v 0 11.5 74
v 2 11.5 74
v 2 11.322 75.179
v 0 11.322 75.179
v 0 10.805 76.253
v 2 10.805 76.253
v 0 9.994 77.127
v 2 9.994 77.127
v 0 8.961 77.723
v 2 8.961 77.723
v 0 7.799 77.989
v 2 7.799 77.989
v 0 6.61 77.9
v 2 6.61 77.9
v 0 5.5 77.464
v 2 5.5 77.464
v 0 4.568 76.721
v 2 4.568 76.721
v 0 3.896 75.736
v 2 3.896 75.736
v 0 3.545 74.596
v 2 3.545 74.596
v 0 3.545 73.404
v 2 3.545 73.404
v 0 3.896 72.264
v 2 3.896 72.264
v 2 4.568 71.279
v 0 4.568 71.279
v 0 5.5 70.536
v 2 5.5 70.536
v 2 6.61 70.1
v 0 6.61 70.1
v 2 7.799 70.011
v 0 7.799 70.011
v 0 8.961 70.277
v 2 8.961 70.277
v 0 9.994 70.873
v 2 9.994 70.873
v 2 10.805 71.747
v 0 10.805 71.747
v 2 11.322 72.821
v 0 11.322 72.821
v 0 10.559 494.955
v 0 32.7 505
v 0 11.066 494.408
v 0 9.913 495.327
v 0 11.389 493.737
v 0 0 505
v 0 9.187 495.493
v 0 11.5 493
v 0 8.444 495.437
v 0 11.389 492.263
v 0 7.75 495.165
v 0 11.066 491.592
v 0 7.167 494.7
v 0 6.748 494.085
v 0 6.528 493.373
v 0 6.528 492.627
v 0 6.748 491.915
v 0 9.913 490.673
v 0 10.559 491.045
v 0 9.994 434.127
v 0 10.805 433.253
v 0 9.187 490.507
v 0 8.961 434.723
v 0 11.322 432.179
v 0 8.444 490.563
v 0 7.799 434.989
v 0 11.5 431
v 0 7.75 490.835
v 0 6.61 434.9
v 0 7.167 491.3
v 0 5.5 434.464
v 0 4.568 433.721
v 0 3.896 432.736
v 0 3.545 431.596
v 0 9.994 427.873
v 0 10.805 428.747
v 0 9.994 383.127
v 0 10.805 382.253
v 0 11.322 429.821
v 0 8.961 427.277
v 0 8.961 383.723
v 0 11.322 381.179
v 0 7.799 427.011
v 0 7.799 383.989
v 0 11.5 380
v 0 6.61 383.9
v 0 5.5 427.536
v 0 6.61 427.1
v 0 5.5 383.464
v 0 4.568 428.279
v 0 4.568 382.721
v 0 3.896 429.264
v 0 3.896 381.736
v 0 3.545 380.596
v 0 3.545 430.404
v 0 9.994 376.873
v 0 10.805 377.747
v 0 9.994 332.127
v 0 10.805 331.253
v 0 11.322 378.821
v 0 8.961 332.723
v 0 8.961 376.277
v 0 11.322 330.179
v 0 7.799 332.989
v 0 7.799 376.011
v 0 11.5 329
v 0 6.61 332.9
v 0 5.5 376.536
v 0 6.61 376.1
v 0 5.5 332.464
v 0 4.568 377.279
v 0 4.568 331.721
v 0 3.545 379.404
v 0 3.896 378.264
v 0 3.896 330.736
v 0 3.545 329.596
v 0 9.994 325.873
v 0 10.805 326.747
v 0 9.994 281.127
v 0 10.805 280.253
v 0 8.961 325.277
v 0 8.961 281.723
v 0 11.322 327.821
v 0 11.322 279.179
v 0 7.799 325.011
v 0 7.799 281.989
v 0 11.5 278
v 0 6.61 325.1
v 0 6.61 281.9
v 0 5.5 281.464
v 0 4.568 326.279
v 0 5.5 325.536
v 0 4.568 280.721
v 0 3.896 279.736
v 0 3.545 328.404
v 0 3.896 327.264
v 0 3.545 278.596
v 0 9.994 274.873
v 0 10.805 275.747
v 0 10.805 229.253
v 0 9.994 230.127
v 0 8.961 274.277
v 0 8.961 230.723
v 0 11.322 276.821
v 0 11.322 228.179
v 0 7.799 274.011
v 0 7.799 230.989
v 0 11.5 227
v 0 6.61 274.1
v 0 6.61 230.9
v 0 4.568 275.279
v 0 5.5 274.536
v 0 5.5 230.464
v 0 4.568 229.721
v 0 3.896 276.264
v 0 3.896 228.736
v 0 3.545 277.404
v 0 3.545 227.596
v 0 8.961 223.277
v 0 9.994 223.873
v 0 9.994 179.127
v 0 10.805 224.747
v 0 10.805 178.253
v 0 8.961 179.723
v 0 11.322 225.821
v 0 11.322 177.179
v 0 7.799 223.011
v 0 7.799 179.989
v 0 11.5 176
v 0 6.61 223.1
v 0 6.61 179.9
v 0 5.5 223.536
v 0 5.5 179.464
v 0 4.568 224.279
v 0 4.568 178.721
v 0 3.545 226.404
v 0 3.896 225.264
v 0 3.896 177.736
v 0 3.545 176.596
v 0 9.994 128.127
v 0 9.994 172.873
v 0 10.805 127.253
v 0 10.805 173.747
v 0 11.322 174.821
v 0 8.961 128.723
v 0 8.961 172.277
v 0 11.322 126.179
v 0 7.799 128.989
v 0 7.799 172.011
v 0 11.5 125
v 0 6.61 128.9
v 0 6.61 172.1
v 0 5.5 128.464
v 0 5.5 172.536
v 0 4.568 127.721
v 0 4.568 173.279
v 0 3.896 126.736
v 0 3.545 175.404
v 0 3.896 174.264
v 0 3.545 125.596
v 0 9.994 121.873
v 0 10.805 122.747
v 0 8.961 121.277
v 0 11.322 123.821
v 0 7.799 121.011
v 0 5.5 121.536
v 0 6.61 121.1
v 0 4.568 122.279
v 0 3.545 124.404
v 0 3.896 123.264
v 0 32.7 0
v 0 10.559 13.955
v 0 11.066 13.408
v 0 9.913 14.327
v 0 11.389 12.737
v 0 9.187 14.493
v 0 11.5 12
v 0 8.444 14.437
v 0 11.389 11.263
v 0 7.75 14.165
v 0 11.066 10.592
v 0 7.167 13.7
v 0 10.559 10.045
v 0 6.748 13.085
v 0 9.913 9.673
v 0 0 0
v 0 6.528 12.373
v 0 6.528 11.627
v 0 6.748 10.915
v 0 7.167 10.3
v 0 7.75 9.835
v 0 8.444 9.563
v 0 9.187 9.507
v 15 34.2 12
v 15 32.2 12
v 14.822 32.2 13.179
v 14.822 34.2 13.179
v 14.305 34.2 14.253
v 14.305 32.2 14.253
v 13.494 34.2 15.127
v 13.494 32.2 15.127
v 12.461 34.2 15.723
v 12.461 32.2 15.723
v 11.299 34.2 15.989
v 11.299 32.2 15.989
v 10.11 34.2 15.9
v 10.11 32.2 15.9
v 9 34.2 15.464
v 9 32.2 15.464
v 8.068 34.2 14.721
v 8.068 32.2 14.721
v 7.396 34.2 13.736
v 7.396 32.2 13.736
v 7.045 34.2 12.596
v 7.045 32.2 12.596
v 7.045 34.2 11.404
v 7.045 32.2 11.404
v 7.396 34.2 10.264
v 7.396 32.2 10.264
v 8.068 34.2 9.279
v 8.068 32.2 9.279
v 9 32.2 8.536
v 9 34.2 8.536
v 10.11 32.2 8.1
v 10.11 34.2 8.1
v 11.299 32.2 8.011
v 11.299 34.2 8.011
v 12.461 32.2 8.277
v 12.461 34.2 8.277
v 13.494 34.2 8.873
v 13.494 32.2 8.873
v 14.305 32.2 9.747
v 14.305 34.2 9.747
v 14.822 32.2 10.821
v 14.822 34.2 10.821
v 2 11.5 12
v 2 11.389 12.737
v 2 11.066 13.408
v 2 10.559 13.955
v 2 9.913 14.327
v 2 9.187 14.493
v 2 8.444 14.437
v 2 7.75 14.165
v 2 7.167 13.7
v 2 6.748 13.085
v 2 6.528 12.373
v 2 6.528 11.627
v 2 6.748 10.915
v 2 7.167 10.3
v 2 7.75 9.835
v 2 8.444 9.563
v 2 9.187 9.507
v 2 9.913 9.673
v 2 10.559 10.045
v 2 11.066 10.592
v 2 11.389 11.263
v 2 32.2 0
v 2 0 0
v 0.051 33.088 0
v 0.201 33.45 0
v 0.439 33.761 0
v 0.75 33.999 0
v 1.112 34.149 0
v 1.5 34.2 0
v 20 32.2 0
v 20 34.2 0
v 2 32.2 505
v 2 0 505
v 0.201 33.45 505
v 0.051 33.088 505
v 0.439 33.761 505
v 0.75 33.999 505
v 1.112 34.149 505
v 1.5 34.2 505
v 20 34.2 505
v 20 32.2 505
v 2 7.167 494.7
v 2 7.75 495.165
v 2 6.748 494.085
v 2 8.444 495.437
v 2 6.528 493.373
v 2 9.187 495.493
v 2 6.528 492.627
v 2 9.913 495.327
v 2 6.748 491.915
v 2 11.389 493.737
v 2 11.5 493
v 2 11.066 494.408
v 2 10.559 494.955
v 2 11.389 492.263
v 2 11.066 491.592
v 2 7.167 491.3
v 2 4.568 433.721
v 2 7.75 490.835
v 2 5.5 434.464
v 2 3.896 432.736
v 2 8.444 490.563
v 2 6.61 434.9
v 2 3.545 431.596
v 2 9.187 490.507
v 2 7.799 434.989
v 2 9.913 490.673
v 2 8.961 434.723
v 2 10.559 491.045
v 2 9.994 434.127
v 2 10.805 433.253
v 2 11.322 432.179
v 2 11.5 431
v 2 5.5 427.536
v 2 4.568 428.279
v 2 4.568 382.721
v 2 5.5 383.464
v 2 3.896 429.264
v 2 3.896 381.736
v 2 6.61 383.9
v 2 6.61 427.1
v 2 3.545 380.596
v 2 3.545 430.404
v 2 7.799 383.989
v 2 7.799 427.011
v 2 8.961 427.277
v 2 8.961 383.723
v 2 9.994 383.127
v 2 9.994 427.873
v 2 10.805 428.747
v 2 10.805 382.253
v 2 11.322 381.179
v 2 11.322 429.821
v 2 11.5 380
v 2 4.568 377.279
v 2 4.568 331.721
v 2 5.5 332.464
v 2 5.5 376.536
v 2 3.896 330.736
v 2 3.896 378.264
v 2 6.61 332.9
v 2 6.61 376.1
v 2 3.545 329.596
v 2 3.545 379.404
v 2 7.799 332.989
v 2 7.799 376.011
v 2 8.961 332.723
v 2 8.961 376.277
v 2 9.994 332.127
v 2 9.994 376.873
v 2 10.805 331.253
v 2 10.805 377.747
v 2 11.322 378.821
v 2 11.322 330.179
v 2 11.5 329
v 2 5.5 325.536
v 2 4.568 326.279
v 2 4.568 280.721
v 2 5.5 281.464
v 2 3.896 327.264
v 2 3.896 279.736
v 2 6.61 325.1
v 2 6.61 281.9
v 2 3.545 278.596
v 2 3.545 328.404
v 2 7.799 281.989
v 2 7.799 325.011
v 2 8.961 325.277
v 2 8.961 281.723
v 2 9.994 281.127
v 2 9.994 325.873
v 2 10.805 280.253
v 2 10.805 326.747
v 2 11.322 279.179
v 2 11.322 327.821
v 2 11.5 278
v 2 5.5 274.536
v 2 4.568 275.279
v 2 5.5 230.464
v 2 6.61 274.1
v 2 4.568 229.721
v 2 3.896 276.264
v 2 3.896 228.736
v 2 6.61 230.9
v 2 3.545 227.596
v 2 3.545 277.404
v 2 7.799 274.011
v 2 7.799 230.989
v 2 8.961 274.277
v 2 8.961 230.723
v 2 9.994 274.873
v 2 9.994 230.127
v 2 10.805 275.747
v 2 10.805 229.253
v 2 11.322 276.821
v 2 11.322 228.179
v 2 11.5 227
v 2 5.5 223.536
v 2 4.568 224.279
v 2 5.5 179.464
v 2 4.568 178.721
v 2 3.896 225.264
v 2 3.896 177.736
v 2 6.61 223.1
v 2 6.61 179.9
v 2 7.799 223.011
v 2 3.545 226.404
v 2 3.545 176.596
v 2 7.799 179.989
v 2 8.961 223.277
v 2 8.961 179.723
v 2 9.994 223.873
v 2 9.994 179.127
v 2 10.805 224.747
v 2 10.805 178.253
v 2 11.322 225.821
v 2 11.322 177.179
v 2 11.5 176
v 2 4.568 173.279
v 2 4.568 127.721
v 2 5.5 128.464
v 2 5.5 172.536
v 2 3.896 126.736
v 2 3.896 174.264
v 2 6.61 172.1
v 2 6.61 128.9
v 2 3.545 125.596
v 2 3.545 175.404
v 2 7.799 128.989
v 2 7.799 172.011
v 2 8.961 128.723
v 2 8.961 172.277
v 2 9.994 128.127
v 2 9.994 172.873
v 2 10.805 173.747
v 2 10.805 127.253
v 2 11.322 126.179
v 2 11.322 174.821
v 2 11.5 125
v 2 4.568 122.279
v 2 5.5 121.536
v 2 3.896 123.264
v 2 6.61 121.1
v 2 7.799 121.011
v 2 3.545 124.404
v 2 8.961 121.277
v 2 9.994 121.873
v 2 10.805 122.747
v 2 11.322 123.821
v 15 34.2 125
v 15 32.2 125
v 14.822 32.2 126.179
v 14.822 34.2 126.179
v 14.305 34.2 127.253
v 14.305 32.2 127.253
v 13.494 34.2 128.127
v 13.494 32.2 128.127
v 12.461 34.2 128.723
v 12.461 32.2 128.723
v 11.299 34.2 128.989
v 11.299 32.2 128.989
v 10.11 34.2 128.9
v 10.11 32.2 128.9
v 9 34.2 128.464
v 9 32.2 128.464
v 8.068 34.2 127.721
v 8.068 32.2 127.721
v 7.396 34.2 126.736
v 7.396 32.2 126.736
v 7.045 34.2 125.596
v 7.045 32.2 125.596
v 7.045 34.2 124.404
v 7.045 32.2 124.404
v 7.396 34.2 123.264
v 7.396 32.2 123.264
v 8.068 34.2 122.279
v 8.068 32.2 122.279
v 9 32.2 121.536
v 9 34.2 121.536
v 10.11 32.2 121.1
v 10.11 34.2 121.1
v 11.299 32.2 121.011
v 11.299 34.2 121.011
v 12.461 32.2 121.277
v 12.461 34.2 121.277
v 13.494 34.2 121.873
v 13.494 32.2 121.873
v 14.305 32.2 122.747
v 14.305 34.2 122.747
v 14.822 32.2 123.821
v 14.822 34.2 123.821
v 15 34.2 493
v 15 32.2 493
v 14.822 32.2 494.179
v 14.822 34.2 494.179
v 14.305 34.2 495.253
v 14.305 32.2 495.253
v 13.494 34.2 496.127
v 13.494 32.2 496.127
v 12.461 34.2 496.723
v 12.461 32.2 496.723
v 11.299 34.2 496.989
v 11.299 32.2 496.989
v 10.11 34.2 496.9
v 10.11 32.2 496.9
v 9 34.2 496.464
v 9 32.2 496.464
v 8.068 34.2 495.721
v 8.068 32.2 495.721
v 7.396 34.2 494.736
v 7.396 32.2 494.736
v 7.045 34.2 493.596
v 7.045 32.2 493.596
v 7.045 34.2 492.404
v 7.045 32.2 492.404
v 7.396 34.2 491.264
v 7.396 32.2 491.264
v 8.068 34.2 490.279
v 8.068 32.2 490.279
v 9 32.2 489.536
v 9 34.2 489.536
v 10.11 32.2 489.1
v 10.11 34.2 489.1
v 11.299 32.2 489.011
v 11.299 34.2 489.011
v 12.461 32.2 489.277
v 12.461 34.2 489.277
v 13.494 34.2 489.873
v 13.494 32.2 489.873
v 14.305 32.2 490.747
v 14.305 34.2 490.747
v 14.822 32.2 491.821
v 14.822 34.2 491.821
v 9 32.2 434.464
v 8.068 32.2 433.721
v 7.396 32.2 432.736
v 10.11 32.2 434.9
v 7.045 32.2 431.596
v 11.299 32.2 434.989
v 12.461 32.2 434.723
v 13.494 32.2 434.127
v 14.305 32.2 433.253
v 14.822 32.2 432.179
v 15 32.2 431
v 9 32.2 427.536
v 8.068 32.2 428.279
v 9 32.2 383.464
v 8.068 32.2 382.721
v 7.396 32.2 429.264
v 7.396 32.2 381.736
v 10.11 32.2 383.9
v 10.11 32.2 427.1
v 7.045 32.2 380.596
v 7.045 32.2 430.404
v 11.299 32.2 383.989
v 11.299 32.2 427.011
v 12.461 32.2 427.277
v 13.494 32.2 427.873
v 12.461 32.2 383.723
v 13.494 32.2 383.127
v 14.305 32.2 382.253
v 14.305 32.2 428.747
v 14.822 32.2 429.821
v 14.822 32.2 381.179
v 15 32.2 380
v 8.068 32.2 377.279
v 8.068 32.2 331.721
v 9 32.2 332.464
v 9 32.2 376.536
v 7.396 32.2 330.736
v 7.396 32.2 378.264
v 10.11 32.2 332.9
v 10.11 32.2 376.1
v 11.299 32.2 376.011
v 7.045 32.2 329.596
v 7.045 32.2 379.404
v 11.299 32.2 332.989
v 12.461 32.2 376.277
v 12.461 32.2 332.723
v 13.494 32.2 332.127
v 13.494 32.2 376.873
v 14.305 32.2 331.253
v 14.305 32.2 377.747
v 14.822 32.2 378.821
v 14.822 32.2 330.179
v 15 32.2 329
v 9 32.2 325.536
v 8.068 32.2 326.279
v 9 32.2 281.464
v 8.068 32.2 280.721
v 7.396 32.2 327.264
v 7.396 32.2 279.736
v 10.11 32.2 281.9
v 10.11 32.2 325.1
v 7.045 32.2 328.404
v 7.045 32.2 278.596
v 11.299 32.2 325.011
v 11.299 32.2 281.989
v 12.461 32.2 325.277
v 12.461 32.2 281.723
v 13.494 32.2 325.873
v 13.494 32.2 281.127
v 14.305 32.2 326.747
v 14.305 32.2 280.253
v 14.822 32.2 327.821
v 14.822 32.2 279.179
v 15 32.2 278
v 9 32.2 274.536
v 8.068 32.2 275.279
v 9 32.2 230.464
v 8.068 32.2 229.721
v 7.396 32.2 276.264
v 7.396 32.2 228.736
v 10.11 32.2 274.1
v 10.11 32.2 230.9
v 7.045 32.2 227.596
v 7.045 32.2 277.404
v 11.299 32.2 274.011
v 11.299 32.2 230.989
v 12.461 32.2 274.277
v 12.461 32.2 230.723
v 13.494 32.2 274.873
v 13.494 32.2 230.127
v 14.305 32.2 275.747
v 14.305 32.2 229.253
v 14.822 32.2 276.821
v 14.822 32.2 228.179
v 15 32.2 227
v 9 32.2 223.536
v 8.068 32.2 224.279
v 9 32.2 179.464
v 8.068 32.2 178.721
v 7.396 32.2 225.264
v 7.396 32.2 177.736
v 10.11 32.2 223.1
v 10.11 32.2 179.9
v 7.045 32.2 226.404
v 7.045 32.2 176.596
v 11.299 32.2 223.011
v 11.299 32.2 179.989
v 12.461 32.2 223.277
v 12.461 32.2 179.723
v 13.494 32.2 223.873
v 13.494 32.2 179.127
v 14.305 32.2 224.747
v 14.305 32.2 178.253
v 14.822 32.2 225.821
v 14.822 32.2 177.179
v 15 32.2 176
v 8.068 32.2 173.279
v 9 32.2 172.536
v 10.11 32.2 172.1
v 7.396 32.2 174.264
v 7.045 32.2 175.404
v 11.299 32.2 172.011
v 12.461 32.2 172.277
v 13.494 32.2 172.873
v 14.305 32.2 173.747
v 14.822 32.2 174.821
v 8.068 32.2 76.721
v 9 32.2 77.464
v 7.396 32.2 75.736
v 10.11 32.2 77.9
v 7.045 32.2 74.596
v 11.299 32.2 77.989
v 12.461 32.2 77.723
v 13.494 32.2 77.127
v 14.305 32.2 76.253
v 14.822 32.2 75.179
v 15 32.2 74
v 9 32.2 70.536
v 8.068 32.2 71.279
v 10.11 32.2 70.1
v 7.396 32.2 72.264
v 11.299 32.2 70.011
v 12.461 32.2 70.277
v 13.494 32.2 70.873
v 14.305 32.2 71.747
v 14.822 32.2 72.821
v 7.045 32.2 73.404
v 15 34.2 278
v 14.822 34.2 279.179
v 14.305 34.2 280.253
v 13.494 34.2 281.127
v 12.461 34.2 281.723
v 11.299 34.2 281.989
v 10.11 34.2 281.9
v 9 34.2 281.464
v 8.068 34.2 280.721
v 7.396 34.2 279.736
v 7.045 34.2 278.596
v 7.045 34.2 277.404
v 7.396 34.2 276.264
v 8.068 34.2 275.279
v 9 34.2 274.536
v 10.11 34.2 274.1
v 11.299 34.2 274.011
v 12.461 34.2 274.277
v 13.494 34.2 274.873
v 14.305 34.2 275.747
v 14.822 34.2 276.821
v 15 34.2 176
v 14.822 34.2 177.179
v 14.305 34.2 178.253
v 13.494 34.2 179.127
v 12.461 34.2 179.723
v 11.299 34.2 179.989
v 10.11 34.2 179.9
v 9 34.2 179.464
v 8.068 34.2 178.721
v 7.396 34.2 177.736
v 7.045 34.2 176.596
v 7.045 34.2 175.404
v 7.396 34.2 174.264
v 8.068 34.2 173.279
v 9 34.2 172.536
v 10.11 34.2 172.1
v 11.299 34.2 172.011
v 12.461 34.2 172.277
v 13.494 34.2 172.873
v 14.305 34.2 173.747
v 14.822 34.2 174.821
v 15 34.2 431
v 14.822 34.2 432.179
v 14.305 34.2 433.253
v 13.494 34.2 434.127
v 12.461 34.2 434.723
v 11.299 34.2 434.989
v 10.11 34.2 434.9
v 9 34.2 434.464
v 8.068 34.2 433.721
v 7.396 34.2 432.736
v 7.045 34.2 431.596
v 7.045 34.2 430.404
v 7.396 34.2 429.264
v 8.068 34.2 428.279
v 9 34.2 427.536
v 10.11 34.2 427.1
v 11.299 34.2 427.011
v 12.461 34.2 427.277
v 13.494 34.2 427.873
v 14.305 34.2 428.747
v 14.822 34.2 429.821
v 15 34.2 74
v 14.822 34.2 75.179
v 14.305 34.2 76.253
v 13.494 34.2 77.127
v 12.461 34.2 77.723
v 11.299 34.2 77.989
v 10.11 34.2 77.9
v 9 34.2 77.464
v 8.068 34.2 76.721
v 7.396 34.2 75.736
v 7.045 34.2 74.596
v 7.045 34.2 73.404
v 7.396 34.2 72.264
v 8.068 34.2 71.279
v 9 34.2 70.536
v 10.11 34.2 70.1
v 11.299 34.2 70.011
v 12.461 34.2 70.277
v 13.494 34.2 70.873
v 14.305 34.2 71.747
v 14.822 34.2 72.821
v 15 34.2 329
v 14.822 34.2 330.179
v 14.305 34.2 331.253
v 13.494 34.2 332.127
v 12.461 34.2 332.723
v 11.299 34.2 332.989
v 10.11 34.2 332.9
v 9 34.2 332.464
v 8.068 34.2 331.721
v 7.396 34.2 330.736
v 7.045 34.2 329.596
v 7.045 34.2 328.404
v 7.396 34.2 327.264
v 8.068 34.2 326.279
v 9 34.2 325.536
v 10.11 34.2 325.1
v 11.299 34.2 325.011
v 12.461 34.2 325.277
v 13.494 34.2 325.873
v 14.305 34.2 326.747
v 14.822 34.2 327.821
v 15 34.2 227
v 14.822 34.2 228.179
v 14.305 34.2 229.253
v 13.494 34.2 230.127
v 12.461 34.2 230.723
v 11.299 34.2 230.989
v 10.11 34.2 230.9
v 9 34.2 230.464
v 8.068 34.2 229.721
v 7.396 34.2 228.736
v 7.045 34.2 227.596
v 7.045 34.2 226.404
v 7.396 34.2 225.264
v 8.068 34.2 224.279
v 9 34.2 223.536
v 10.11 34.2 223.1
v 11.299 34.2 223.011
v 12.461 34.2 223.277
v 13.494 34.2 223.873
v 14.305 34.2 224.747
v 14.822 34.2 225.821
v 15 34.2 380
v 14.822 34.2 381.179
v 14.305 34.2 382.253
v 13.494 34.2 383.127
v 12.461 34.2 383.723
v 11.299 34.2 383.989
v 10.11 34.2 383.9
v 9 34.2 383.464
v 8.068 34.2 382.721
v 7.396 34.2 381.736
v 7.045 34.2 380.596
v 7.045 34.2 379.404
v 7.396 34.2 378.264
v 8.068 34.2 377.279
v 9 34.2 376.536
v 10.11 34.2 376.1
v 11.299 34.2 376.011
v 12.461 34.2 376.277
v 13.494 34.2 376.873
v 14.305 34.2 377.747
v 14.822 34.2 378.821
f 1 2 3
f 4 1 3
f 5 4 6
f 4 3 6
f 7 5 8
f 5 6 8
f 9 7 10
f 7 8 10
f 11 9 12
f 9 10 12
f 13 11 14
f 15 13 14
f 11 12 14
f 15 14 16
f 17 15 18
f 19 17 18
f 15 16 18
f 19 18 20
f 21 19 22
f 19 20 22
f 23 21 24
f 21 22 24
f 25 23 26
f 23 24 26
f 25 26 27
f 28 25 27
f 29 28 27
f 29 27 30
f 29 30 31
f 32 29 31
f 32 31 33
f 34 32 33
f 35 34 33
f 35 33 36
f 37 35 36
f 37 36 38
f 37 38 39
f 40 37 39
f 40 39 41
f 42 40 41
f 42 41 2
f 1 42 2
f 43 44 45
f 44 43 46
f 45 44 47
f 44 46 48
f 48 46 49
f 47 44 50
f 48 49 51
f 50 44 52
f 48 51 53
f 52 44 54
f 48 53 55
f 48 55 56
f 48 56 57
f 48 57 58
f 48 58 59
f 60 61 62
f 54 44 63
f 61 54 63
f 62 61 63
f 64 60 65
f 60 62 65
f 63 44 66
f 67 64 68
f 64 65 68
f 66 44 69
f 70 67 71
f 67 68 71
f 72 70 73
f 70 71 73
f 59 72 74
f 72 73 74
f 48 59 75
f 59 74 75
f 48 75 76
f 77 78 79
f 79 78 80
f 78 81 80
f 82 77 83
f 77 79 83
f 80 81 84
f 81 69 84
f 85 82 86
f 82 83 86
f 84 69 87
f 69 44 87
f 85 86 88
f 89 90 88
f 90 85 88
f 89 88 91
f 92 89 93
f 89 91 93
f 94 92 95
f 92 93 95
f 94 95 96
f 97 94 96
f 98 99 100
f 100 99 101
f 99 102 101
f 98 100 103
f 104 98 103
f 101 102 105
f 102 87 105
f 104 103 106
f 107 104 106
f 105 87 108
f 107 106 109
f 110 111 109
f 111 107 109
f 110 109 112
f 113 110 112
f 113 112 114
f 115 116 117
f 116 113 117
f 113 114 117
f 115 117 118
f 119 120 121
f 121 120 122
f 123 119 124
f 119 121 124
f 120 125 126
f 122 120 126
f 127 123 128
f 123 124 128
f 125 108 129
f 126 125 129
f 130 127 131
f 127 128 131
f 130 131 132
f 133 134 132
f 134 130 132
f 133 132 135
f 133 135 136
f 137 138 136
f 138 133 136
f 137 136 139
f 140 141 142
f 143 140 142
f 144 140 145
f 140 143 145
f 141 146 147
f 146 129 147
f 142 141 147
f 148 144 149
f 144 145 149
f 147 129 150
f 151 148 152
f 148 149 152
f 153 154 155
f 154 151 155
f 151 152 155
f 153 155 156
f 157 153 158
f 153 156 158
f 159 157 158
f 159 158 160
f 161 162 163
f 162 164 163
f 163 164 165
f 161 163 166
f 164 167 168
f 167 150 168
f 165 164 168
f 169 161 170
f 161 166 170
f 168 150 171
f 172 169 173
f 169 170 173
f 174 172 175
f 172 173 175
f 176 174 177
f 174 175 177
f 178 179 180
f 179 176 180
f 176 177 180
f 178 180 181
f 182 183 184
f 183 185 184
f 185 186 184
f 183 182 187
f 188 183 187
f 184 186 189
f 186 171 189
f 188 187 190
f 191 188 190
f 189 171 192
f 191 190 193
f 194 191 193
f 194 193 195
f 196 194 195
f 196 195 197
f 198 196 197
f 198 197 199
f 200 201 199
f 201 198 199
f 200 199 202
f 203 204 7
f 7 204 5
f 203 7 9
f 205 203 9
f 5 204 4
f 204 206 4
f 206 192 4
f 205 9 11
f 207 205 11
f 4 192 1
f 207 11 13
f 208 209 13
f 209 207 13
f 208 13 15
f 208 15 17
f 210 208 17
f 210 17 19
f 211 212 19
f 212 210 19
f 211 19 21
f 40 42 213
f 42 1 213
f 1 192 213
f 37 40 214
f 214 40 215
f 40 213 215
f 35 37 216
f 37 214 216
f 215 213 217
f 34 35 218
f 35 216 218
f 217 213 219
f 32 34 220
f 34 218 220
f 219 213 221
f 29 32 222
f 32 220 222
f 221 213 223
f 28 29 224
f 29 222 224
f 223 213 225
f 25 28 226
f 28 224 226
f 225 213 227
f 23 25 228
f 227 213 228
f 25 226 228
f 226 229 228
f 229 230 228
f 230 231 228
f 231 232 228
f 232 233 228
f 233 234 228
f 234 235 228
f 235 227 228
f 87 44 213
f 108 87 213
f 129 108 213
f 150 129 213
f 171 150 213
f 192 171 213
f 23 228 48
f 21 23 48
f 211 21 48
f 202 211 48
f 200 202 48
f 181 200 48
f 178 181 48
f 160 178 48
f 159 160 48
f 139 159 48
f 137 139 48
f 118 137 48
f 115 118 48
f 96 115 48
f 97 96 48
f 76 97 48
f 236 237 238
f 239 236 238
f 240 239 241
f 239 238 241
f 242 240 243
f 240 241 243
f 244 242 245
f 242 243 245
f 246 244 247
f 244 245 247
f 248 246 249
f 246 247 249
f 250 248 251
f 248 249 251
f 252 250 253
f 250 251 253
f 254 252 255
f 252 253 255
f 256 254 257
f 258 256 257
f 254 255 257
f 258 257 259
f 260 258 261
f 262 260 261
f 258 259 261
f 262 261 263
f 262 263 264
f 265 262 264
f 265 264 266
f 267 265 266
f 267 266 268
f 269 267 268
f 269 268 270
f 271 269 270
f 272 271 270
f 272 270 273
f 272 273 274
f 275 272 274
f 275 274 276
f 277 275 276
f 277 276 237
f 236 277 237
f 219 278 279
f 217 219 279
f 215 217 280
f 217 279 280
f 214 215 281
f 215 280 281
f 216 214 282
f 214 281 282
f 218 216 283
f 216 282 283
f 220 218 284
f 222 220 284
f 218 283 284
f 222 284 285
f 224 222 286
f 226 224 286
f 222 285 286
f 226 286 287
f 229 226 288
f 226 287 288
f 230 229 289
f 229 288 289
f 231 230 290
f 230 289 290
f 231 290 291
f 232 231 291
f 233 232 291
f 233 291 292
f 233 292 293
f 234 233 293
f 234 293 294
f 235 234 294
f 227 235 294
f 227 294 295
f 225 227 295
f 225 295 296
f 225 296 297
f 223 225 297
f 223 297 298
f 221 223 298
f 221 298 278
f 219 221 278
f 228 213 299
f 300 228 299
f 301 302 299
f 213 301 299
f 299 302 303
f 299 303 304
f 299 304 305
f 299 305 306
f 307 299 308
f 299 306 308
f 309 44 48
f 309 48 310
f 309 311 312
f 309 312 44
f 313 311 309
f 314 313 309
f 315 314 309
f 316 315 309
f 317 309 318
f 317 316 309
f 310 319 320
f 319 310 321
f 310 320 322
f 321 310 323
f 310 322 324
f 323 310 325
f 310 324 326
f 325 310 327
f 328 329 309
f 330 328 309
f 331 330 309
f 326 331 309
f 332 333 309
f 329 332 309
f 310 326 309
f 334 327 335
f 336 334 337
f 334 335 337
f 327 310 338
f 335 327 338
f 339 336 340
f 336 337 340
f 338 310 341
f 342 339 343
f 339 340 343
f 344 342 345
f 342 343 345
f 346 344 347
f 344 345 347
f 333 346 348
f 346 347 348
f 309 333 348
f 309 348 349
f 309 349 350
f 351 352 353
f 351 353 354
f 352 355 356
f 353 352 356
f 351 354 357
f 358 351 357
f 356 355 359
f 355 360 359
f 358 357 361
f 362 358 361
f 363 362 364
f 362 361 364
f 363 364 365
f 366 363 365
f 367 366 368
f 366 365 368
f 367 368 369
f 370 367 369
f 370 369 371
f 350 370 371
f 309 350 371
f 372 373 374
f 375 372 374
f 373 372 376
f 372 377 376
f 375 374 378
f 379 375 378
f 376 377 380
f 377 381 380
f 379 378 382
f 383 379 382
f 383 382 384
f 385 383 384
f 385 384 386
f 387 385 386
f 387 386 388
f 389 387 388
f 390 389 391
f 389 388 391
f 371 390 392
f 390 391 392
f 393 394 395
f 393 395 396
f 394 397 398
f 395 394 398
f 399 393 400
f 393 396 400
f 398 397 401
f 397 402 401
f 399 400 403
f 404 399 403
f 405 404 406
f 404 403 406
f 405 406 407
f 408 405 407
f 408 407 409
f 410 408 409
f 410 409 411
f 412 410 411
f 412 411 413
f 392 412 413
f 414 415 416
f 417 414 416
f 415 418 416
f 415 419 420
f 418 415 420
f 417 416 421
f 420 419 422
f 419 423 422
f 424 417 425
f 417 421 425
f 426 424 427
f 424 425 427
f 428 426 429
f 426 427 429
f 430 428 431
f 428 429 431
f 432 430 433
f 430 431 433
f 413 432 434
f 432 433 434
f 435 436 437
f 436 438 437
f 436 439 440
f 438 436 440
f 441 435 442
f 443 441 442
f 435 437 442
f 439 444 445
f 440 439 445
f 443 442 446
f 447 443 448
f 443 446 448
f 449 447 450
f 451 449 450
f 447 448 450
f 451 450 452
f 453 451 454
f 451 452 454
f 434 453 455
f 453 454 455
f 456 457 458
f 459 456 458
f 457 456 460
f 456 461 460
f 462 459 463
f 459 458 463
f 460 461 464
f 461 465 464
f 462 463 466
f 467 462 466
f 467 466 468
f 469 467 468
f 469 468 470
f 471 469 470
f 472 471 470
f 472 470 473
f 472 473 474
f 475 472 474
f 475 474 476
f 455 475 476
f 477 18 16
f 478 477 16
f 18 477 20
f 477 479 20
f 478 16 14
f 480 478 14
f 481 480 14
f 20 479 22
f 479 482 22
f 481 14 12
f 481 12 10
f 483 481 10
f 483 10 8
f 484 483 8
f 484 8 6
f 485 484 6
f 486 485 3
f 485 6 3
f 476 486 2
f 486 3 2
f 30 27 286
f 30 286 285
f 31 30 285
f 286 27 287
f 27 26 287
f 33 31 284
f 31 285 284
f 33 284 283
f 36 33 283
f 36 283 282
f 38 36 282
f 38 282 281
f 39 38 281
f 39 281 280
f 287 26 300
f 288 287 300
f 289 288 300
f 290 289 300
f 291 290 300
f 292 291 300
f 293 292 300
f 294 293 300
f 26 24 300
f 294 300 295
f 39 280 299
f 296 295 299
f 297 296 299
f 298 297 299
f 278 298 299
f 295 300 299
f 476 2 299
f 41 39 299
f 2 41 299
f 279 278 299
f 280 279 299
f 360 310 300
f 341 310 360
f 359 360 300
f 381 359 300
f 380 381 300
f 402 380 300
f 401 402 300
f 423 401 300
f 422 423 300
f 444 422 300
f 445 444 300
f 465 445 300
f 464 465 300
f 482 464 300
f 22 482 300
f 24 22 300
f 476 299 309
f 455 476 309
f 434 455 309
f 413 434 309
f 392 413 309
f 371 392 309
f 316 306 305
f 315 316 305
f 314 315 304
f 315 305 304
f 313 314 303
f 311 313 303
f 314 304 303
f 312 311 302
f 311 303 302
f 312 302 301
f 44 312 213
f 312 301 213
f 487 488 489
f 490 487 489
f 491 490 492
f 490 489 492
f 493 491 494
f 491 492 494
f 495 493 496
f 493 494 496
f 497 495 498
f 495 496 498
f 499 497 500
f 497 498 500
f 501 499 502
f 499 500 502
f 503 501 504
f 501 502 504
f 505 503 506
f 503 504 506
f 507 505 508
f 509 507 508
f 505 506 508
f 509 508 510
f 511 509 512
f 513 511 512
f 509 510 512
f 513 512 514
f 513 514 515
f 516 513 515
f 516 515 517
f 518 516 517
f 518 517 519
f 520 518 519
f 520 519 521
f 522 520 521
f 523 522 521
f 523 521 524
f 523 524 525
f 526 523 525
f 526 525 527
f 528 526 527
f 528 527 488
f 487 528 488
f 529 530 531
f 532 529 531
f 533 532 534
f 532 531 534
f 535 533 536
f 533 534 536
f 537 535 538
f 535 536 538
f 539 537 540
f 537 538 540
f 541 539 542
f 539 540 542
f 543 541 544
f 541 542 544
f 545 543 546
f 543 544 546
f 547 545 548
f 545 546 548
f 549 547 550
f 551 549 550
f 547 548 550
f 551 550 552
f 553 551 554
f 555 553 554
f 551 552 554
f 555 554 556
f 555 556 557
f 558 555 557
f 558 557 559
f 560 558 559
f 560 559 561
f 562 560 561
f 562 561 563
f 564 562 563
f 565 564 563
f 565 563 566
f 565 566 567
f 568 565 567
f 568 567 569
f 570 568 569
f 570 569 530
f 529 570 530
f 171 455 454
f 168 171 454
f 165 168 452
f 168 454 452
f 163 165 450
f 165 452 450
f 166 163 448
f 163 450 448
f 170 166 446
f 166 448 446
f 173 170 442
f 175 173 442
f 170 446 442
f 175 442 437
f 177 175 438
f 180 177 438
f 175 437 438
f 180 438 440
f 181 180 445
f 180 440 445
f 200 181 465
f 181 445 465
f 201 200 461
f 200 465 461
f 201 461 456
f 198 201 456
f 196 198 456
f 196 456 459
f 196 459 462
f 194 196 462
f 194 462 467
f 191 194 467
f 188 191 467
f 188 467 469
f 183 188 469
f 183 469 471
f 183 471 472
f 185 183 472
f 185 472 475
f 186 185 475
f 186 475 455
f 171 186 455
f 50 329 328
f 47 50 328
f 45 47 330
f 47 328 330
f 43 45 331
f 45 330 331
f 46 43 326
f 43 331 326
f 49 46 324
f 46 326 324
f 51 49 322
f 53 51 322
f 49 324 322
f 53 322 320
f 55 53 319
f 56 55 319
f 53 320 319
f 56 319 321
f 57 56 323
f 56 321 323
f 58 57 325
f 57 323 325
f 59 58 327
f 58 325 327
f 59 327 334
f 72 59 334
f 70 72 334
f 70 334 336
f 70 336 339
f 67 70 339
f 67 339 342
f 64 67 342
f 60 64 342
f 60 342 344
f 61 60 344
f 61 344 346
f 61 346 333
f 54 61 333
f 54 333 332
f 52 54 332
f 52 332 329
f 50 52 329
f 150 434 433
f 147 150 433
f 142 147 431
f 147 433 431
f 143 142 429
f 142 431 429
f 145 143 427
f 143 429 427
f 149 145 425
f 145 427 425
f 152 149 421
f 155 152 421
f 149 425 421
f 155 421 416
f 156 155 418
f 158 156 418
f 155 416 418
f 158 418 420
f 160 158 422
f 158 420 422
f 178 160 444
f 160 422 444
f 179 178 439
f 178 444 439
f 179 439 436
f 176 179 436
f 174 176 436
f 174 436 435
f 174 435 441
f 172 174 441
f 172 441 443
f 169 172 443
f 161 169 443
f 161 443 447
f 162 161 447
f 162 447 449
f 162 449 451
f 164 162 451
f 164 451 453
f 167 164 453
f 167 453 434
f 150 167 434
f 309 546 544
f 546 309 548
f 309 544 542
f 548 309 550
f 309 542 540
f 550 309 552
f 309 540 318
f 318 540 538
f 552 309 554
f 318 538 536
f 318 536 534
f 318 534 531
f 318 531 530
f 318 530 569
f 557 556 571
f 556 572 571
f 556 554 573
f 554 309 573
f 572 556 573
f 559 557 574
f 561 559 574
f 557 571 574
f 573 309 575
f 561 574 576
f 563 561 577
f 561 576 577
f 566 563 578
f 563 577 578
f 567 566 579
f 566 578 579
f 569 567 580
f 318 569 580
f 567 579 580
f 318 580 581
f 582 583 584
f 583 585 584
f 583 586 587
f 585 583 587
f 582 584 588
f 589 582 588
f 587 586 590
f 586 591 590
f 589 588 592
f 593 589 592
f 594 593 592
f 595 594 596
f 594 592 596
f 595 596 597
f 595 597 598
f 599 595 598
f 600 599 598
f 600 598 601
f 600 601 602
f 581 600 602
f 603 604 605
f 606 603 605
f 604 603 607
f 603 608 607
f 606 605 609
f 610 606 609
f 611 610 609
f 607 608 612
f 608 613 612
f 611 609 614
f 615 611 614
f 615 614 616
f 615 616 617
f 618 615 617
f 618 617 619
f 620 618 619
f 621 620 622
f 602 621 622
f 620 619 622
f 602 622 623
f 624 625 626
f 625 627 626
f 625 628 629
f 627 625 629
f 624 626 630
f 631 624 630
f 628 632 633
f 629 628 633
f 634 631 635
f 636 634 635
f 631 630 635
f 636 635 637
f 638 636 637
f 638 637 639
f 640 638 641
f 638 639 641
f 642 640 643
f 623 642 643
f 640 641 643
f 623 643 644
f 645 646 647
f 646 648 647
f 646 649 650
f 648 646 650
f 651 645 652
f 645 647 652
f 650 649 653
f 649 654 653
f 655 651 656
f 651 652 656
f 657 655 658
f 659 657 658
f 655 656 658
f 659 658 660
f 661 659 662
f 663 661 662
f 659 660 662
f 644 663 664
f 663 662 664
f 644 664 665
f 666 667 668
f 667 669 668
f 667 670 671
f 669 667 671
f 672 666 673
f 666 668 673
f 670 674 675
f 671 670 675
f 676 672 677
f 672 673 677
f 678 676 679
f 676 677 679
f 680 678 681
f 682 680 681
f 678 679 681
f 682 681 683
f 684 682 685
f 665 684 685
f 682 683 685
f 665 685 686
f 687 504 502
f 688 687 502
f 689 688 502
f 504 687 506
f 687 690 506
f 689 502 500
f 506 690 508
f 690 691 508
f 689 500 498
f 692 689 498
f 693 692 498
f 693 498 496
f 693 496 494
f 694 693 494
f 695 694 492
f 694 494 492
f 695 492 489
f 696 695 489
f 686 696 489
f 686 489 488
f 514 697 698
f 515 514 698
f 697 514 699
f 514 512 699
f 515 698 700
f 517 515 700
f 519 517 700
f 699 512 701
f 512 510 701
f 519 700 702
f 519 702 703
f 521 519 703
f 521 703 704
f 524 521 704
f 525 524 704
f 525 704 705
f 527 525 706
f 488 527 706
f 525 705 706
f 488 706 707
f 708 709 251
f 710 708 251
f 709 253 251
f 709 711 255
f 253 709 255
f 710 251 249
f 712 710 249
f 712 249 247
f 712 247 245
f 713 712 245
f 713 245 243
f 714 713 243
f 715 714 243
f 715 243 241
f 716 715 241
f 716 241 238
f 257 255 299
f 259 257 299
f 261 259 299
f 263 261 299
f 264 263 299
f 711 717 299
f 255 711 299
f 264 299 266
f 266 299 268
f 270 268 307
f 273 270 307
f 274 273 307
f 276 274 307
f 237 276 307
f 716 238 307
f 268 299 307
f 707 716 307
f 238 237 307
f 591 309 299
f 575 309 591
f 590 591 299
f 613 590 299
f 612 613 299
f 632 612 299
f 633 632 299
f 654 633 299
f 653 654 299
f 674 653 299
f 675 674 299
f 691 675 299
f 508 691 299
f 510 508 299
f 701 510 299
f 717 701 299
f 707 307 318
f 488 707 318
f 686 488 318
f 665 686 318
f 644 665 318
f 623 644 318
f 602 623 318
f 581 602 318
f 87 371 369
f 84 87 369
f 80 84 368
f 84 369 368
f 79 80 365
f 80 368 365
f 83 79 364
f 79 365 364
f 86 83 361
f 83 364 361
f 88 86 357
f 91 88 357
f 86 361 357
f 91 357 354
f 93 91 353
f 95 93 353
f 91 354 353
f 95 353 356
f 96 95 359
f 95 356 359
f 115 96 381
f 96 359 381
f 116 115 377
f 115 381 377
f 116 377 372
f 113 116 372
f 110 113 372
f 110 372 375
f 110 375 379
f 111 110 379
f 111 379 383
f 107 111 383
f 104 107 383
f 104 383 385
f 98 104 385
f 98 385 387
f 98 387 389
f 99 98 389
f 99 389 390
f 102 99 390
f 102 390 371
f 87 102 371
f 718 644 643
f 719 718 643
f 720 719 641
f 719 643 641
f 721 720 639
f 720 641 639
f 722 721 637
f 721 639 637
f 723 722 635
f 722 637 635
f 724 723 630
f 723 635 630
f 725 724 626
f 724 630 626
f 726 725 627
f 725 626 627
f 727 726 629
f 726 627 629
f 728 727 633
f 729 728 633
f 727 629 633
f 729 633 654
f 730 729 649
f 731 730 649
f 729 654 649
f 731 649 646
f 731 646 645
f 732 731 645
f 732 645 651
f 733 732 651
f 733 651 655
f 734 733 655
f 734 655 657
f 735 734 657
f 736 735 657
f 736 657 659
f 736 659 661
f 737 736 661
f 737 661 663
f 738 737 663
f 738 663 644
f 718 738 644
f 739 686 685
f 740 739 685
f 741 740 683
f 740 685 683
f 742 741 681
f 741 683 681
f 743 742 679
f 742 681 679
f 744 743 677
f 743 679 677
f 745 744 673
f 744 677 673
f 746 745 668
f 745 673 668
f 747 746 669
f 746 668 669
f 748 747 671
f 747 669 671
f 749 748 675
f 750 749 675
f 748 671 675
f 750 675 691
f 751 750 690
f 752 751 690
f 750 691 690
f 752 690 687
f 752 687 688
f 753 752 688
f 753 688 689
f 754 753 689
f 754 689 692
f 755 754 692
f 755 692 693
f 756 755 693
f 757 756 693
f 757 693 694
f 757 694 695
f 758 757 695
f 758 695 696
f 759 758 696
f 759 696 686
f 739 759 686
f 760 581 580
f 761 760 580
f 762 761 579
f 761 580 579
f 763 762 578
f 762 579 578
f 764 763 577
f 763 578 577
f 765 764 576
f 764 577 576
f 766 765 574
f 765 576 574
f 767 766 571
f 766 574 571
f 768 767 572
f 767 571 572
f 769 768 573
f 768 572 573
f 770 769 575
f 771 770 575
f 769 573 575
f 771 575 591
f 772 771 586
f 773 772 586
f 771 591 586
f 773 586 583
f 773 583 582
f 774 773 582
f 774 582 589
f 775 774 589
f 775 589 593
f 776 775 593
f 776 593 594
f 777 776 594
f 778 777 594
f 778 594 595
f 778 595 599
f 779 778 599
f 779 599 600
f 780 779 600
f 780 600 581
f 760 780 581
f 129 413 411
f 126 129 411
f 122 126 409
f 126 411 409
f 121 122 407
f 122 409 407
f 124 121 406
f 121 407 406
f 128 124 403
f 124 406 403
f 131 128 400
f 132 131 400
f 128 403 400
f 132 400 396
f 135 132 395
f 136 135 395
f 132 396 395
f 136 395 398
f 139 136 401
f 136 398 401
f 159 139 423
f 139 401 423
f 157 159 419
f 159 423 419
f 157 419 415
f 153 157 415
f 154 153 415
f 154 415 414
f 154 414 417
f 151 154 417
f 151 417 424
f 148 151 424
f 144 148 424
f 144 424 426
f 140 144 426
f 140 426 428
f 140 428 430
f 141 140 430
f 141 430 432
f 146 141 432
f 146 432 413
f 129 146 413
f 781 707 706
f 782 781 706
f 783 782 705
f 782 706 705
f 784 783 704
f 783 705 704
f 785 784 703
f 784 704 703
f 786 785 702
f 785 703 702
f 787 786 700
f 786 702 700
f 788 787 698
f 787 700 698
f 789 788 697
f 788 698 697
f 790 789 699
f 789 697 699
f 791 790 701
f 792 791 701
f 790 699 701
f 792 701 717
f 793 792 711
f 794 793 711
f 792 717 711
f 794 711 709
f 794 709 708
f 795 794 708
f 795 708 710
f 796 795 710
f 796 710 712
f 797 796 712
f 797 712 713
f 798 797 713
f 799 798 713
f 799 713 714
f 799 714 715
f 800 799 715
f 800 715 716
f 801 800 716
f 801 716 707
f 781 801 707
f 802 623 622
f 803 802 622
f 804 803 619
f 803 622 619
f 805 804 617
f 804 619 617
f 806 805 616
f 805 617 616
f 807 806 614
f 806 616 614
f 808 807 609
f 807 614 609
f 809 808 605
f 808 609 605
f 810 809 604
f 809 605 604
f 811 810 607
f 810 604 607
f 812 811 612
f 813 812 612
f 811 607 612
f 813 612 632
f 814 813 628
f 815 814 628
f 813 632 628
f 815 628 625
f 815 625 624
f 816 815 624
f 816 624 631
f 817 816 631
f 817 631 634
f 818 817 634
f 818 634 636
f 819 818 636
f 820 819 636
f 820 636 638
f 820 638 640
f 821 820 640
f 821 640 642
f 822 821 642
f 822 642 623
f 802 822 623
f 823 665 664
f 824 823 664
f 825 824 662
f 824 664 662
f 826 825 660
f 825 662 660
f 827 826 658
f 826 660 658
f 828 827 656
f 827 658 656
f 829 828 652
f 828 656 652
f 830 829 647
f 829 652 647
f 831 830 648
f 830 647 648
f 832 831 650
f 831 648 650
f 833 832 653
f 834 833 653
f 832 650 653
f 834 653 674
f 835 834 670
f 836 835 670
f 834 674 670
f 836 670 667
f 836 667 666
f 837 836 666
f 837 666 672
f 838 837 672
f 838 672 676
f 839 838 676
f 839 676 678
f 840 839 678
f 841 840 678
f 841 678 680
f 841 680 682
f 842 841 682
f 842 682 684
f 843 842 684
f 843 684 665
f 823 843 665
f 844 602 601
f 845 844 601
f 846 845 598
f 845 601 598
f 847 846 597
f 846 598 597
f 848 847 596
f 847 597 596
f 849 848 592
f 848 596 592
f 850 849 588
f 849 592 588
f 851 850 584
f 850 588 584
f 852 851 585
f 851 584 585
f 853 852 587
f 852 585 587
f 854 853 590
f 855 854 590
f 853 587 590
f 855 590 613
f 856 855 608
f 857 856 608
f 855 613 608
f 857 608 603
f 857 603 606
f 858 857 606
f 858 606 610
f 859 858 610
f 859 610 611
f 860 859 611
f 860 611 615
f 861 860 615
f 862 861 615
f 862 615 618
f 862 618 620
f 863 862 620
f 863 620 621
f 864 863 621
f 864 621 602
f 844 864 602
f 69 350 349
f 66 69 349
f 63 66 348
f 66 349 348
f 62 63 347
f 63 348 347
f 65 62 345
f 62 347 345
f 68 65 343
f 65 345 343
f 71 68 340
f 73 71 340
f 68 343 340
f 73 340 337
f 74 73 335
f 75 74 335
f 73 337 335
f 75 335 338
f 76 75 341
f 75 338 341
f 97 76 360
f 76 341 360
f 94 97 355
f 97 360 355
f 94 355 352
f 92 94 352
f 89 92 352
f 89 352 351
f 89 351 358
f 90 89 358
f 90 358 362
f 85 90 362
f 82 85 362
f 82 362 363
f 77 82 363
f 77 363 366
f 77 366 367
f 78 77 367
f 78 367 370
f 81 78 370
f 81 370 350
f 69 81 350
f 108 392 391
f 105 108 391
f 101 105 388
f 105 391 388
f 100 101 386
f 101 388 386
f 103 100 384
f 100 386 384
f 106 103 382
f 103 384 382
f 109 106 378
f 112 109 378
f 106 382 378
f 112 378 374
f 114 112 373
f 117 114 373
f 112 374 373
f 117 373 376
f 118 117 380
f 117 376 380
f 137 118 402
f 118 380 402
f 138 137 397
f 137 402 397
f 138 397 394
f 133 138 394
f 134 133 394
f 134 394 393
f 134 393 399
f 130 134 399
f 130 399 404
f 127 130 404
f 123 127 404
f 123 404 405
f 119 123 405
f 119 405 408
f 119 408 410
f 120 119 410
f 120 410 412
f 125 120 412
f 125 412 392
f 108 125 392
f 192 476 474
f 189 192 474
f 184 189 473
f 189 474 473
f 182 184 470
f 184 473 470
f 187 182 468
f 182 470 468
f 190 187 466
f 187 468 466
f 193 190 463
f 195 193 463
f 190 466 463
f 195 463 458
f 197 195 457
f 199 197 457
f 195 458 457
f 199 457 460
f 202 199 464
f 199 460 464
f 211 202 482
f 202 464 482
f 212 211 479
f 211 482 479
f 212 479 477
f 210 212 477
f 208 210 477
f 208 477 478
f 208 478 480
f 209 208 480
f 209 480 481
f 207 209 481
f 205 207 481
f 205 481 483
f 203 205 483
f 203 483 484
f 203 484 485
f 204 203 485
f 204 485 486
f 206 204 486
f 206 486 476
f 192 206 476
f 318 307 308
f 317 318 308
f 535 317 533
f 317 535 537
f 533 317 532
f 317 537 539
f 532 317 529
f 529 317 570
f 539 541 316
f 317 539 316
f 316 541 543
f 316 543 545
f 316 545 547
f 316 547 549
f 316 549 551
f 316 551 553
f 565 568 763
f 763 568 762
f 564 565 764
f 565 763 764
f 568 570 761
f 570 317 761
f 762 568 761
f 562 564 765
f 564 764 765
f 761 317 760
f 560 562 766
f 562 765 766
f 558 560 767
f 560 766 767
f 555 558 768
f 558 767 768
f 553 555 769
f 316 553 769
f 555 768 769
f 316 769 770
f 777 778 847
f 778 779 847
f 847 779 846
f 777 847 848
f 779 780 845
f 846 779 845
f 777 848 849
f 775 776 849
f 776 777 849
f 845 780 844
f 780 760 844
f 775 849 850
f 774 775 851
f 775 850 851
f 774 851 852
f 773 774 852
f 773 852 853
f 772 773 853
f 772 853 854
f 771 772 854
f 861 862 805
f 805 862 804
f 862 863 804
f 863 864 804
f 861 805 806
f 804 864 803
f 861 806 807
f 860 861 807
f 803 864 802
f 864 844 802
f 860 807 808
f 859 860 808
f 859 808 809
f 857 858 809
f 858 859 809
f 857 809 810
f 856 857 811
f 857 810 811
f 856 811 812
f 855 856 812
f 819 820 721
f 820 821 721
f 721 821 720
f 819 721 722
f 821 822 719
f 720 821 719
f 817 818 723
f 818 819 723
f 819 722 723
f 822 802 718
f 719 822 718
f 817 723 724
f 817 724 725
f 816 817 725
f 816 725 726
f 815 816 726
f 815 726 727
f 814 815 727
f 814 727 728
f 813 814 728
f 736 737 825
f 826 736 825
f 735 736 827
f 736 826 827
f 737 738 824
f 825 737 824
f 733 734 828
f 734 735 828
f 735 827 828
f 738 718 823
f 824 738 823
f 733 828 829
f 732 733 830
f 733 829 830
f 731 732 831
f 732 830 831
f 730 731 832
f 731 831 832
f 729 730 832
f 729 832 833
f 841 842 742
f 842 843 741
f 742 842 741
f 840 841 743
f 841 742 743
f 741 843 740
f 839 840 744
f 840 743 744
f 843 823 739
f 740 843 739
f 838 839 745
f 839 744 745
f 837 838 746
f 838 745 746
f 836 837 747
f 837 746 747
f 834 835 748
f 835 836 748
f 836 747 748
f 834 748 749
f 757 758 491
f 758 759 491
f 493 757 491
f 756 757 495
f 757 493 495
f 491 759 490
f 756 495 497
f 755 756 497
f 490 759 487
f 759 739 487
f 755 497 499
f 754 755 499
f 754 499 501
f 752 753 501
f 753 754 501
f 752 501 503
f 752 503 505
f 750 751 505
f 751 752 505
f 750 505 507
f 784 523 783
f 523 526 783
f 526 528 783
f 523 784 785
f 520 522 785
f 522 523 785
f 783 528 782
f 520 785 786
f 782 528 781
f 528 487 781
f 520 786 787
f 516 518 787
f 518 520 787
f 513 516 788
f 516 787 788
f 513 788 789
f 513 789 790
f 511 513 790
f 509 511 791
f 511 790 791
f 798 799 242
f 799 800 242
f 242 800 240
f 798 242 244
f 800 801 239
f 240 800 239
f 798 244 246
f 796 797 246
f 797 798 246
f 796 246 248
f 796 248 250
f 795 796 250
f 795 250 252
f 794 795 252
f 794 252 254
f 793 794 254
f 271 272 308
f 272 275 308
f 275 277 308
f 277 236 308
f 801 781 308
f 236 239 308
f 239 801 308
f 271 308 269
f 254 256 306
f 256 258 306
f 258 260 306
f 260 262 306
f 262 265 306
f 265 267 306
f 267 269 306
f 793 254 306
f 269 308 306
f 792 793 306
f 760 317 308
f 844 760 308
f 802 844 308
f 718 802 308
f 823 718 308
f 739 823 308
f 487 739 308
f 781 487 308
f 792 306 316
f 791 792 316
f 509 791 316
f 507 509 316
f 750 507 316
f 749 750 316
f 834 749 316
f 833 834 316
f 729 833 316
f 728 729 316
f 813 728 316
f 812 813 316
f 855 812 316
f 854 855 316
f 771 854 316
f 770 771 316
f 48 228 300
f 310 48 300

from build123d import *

# Parameters (mm, degrees)
F1_DEPTH = 505
F2_R     = 4
F2_R_2   = 2.5
F3_DEPTH = 2.001
F4_R     = 4
F5_DEPTH = 2.001


with BuildPart() as f1:
    # F0 (on Top) → F1 (new body)
    with BuildSketch(Plane.XY):
        with BuildLine():
            Line((0, 32.7), (0, 0))
            Line((0, 0), (2, 0))
            Line((2, 0), (2, 32.2))
            Line((2, 32.2), (20, 32.2))
            Line((20, 32.2), (20, 34.2))
            Line((20, 34.2), (1.5, 34.2))
            ThreePointArc((1.5, 34.2), (0.43934, 33.76066), (0, 32.7))
        make_face()
    extrude(amount=F1_DEPTH)

    # F2 (on face) → F3 (cut, through all)
    with BuildSketch(Plane.YZ.offset(2)):
        with Locations((7.5, 431)):
            Circle(F2_R)
        with Locations((7.5, 380)):
            Circle(F2_R)
        with Locations((7.5, 329)):
            Circle(F2_R)
        with Locations((7.5, 278)):
            Circle(F2_R)
        with Locations((7.5, 227)):
            Circle(F2_R)
        with Locations((7.5, 176)):
            Circle(F2_R)
        with Locations((7.5, 125)):
            Circle(F2_R)
        with Locations((7.5, 74)):
            Circle(F2_R)
        with Locations((9, 12)):
            Circle(F2_R_2)
        with Locations((9, 493)):
            Circle(F2_R_2)
    extrude(amount=-F3_DEPTH, mode=Mode.SUBTRACT)

    # F4 (on face) → F5 (cut, through all)
    with BuildSketch(Plane.XZ.offset(-32.2)):
        with Locations((11, 74)):
            Circle(F4_R)
        with Locations((11, 125)):
            Circle(F4_R)
        with Locations((11, 12)):
            Circle(F4_R)
        with Locations((11, 176)):
            Circle(F4_R)
        with Locations((11, 227)):
            Circle(F4_R)
        with Locations((11, 278)):
            Circle(F4_R)
        with Locations((11, 329)):
            Circle(F4_R)
        with Locations((11, 380)):
            Circle(F4_R)
        with Locations((11, 431)):
            Circle(F4_R)
        with Locations((11, 493)):
            Circle(F4_R)
    extrude(amount=-F5_DEPTH, mode=Mode.SUBTRACT)


solid = f1.part
